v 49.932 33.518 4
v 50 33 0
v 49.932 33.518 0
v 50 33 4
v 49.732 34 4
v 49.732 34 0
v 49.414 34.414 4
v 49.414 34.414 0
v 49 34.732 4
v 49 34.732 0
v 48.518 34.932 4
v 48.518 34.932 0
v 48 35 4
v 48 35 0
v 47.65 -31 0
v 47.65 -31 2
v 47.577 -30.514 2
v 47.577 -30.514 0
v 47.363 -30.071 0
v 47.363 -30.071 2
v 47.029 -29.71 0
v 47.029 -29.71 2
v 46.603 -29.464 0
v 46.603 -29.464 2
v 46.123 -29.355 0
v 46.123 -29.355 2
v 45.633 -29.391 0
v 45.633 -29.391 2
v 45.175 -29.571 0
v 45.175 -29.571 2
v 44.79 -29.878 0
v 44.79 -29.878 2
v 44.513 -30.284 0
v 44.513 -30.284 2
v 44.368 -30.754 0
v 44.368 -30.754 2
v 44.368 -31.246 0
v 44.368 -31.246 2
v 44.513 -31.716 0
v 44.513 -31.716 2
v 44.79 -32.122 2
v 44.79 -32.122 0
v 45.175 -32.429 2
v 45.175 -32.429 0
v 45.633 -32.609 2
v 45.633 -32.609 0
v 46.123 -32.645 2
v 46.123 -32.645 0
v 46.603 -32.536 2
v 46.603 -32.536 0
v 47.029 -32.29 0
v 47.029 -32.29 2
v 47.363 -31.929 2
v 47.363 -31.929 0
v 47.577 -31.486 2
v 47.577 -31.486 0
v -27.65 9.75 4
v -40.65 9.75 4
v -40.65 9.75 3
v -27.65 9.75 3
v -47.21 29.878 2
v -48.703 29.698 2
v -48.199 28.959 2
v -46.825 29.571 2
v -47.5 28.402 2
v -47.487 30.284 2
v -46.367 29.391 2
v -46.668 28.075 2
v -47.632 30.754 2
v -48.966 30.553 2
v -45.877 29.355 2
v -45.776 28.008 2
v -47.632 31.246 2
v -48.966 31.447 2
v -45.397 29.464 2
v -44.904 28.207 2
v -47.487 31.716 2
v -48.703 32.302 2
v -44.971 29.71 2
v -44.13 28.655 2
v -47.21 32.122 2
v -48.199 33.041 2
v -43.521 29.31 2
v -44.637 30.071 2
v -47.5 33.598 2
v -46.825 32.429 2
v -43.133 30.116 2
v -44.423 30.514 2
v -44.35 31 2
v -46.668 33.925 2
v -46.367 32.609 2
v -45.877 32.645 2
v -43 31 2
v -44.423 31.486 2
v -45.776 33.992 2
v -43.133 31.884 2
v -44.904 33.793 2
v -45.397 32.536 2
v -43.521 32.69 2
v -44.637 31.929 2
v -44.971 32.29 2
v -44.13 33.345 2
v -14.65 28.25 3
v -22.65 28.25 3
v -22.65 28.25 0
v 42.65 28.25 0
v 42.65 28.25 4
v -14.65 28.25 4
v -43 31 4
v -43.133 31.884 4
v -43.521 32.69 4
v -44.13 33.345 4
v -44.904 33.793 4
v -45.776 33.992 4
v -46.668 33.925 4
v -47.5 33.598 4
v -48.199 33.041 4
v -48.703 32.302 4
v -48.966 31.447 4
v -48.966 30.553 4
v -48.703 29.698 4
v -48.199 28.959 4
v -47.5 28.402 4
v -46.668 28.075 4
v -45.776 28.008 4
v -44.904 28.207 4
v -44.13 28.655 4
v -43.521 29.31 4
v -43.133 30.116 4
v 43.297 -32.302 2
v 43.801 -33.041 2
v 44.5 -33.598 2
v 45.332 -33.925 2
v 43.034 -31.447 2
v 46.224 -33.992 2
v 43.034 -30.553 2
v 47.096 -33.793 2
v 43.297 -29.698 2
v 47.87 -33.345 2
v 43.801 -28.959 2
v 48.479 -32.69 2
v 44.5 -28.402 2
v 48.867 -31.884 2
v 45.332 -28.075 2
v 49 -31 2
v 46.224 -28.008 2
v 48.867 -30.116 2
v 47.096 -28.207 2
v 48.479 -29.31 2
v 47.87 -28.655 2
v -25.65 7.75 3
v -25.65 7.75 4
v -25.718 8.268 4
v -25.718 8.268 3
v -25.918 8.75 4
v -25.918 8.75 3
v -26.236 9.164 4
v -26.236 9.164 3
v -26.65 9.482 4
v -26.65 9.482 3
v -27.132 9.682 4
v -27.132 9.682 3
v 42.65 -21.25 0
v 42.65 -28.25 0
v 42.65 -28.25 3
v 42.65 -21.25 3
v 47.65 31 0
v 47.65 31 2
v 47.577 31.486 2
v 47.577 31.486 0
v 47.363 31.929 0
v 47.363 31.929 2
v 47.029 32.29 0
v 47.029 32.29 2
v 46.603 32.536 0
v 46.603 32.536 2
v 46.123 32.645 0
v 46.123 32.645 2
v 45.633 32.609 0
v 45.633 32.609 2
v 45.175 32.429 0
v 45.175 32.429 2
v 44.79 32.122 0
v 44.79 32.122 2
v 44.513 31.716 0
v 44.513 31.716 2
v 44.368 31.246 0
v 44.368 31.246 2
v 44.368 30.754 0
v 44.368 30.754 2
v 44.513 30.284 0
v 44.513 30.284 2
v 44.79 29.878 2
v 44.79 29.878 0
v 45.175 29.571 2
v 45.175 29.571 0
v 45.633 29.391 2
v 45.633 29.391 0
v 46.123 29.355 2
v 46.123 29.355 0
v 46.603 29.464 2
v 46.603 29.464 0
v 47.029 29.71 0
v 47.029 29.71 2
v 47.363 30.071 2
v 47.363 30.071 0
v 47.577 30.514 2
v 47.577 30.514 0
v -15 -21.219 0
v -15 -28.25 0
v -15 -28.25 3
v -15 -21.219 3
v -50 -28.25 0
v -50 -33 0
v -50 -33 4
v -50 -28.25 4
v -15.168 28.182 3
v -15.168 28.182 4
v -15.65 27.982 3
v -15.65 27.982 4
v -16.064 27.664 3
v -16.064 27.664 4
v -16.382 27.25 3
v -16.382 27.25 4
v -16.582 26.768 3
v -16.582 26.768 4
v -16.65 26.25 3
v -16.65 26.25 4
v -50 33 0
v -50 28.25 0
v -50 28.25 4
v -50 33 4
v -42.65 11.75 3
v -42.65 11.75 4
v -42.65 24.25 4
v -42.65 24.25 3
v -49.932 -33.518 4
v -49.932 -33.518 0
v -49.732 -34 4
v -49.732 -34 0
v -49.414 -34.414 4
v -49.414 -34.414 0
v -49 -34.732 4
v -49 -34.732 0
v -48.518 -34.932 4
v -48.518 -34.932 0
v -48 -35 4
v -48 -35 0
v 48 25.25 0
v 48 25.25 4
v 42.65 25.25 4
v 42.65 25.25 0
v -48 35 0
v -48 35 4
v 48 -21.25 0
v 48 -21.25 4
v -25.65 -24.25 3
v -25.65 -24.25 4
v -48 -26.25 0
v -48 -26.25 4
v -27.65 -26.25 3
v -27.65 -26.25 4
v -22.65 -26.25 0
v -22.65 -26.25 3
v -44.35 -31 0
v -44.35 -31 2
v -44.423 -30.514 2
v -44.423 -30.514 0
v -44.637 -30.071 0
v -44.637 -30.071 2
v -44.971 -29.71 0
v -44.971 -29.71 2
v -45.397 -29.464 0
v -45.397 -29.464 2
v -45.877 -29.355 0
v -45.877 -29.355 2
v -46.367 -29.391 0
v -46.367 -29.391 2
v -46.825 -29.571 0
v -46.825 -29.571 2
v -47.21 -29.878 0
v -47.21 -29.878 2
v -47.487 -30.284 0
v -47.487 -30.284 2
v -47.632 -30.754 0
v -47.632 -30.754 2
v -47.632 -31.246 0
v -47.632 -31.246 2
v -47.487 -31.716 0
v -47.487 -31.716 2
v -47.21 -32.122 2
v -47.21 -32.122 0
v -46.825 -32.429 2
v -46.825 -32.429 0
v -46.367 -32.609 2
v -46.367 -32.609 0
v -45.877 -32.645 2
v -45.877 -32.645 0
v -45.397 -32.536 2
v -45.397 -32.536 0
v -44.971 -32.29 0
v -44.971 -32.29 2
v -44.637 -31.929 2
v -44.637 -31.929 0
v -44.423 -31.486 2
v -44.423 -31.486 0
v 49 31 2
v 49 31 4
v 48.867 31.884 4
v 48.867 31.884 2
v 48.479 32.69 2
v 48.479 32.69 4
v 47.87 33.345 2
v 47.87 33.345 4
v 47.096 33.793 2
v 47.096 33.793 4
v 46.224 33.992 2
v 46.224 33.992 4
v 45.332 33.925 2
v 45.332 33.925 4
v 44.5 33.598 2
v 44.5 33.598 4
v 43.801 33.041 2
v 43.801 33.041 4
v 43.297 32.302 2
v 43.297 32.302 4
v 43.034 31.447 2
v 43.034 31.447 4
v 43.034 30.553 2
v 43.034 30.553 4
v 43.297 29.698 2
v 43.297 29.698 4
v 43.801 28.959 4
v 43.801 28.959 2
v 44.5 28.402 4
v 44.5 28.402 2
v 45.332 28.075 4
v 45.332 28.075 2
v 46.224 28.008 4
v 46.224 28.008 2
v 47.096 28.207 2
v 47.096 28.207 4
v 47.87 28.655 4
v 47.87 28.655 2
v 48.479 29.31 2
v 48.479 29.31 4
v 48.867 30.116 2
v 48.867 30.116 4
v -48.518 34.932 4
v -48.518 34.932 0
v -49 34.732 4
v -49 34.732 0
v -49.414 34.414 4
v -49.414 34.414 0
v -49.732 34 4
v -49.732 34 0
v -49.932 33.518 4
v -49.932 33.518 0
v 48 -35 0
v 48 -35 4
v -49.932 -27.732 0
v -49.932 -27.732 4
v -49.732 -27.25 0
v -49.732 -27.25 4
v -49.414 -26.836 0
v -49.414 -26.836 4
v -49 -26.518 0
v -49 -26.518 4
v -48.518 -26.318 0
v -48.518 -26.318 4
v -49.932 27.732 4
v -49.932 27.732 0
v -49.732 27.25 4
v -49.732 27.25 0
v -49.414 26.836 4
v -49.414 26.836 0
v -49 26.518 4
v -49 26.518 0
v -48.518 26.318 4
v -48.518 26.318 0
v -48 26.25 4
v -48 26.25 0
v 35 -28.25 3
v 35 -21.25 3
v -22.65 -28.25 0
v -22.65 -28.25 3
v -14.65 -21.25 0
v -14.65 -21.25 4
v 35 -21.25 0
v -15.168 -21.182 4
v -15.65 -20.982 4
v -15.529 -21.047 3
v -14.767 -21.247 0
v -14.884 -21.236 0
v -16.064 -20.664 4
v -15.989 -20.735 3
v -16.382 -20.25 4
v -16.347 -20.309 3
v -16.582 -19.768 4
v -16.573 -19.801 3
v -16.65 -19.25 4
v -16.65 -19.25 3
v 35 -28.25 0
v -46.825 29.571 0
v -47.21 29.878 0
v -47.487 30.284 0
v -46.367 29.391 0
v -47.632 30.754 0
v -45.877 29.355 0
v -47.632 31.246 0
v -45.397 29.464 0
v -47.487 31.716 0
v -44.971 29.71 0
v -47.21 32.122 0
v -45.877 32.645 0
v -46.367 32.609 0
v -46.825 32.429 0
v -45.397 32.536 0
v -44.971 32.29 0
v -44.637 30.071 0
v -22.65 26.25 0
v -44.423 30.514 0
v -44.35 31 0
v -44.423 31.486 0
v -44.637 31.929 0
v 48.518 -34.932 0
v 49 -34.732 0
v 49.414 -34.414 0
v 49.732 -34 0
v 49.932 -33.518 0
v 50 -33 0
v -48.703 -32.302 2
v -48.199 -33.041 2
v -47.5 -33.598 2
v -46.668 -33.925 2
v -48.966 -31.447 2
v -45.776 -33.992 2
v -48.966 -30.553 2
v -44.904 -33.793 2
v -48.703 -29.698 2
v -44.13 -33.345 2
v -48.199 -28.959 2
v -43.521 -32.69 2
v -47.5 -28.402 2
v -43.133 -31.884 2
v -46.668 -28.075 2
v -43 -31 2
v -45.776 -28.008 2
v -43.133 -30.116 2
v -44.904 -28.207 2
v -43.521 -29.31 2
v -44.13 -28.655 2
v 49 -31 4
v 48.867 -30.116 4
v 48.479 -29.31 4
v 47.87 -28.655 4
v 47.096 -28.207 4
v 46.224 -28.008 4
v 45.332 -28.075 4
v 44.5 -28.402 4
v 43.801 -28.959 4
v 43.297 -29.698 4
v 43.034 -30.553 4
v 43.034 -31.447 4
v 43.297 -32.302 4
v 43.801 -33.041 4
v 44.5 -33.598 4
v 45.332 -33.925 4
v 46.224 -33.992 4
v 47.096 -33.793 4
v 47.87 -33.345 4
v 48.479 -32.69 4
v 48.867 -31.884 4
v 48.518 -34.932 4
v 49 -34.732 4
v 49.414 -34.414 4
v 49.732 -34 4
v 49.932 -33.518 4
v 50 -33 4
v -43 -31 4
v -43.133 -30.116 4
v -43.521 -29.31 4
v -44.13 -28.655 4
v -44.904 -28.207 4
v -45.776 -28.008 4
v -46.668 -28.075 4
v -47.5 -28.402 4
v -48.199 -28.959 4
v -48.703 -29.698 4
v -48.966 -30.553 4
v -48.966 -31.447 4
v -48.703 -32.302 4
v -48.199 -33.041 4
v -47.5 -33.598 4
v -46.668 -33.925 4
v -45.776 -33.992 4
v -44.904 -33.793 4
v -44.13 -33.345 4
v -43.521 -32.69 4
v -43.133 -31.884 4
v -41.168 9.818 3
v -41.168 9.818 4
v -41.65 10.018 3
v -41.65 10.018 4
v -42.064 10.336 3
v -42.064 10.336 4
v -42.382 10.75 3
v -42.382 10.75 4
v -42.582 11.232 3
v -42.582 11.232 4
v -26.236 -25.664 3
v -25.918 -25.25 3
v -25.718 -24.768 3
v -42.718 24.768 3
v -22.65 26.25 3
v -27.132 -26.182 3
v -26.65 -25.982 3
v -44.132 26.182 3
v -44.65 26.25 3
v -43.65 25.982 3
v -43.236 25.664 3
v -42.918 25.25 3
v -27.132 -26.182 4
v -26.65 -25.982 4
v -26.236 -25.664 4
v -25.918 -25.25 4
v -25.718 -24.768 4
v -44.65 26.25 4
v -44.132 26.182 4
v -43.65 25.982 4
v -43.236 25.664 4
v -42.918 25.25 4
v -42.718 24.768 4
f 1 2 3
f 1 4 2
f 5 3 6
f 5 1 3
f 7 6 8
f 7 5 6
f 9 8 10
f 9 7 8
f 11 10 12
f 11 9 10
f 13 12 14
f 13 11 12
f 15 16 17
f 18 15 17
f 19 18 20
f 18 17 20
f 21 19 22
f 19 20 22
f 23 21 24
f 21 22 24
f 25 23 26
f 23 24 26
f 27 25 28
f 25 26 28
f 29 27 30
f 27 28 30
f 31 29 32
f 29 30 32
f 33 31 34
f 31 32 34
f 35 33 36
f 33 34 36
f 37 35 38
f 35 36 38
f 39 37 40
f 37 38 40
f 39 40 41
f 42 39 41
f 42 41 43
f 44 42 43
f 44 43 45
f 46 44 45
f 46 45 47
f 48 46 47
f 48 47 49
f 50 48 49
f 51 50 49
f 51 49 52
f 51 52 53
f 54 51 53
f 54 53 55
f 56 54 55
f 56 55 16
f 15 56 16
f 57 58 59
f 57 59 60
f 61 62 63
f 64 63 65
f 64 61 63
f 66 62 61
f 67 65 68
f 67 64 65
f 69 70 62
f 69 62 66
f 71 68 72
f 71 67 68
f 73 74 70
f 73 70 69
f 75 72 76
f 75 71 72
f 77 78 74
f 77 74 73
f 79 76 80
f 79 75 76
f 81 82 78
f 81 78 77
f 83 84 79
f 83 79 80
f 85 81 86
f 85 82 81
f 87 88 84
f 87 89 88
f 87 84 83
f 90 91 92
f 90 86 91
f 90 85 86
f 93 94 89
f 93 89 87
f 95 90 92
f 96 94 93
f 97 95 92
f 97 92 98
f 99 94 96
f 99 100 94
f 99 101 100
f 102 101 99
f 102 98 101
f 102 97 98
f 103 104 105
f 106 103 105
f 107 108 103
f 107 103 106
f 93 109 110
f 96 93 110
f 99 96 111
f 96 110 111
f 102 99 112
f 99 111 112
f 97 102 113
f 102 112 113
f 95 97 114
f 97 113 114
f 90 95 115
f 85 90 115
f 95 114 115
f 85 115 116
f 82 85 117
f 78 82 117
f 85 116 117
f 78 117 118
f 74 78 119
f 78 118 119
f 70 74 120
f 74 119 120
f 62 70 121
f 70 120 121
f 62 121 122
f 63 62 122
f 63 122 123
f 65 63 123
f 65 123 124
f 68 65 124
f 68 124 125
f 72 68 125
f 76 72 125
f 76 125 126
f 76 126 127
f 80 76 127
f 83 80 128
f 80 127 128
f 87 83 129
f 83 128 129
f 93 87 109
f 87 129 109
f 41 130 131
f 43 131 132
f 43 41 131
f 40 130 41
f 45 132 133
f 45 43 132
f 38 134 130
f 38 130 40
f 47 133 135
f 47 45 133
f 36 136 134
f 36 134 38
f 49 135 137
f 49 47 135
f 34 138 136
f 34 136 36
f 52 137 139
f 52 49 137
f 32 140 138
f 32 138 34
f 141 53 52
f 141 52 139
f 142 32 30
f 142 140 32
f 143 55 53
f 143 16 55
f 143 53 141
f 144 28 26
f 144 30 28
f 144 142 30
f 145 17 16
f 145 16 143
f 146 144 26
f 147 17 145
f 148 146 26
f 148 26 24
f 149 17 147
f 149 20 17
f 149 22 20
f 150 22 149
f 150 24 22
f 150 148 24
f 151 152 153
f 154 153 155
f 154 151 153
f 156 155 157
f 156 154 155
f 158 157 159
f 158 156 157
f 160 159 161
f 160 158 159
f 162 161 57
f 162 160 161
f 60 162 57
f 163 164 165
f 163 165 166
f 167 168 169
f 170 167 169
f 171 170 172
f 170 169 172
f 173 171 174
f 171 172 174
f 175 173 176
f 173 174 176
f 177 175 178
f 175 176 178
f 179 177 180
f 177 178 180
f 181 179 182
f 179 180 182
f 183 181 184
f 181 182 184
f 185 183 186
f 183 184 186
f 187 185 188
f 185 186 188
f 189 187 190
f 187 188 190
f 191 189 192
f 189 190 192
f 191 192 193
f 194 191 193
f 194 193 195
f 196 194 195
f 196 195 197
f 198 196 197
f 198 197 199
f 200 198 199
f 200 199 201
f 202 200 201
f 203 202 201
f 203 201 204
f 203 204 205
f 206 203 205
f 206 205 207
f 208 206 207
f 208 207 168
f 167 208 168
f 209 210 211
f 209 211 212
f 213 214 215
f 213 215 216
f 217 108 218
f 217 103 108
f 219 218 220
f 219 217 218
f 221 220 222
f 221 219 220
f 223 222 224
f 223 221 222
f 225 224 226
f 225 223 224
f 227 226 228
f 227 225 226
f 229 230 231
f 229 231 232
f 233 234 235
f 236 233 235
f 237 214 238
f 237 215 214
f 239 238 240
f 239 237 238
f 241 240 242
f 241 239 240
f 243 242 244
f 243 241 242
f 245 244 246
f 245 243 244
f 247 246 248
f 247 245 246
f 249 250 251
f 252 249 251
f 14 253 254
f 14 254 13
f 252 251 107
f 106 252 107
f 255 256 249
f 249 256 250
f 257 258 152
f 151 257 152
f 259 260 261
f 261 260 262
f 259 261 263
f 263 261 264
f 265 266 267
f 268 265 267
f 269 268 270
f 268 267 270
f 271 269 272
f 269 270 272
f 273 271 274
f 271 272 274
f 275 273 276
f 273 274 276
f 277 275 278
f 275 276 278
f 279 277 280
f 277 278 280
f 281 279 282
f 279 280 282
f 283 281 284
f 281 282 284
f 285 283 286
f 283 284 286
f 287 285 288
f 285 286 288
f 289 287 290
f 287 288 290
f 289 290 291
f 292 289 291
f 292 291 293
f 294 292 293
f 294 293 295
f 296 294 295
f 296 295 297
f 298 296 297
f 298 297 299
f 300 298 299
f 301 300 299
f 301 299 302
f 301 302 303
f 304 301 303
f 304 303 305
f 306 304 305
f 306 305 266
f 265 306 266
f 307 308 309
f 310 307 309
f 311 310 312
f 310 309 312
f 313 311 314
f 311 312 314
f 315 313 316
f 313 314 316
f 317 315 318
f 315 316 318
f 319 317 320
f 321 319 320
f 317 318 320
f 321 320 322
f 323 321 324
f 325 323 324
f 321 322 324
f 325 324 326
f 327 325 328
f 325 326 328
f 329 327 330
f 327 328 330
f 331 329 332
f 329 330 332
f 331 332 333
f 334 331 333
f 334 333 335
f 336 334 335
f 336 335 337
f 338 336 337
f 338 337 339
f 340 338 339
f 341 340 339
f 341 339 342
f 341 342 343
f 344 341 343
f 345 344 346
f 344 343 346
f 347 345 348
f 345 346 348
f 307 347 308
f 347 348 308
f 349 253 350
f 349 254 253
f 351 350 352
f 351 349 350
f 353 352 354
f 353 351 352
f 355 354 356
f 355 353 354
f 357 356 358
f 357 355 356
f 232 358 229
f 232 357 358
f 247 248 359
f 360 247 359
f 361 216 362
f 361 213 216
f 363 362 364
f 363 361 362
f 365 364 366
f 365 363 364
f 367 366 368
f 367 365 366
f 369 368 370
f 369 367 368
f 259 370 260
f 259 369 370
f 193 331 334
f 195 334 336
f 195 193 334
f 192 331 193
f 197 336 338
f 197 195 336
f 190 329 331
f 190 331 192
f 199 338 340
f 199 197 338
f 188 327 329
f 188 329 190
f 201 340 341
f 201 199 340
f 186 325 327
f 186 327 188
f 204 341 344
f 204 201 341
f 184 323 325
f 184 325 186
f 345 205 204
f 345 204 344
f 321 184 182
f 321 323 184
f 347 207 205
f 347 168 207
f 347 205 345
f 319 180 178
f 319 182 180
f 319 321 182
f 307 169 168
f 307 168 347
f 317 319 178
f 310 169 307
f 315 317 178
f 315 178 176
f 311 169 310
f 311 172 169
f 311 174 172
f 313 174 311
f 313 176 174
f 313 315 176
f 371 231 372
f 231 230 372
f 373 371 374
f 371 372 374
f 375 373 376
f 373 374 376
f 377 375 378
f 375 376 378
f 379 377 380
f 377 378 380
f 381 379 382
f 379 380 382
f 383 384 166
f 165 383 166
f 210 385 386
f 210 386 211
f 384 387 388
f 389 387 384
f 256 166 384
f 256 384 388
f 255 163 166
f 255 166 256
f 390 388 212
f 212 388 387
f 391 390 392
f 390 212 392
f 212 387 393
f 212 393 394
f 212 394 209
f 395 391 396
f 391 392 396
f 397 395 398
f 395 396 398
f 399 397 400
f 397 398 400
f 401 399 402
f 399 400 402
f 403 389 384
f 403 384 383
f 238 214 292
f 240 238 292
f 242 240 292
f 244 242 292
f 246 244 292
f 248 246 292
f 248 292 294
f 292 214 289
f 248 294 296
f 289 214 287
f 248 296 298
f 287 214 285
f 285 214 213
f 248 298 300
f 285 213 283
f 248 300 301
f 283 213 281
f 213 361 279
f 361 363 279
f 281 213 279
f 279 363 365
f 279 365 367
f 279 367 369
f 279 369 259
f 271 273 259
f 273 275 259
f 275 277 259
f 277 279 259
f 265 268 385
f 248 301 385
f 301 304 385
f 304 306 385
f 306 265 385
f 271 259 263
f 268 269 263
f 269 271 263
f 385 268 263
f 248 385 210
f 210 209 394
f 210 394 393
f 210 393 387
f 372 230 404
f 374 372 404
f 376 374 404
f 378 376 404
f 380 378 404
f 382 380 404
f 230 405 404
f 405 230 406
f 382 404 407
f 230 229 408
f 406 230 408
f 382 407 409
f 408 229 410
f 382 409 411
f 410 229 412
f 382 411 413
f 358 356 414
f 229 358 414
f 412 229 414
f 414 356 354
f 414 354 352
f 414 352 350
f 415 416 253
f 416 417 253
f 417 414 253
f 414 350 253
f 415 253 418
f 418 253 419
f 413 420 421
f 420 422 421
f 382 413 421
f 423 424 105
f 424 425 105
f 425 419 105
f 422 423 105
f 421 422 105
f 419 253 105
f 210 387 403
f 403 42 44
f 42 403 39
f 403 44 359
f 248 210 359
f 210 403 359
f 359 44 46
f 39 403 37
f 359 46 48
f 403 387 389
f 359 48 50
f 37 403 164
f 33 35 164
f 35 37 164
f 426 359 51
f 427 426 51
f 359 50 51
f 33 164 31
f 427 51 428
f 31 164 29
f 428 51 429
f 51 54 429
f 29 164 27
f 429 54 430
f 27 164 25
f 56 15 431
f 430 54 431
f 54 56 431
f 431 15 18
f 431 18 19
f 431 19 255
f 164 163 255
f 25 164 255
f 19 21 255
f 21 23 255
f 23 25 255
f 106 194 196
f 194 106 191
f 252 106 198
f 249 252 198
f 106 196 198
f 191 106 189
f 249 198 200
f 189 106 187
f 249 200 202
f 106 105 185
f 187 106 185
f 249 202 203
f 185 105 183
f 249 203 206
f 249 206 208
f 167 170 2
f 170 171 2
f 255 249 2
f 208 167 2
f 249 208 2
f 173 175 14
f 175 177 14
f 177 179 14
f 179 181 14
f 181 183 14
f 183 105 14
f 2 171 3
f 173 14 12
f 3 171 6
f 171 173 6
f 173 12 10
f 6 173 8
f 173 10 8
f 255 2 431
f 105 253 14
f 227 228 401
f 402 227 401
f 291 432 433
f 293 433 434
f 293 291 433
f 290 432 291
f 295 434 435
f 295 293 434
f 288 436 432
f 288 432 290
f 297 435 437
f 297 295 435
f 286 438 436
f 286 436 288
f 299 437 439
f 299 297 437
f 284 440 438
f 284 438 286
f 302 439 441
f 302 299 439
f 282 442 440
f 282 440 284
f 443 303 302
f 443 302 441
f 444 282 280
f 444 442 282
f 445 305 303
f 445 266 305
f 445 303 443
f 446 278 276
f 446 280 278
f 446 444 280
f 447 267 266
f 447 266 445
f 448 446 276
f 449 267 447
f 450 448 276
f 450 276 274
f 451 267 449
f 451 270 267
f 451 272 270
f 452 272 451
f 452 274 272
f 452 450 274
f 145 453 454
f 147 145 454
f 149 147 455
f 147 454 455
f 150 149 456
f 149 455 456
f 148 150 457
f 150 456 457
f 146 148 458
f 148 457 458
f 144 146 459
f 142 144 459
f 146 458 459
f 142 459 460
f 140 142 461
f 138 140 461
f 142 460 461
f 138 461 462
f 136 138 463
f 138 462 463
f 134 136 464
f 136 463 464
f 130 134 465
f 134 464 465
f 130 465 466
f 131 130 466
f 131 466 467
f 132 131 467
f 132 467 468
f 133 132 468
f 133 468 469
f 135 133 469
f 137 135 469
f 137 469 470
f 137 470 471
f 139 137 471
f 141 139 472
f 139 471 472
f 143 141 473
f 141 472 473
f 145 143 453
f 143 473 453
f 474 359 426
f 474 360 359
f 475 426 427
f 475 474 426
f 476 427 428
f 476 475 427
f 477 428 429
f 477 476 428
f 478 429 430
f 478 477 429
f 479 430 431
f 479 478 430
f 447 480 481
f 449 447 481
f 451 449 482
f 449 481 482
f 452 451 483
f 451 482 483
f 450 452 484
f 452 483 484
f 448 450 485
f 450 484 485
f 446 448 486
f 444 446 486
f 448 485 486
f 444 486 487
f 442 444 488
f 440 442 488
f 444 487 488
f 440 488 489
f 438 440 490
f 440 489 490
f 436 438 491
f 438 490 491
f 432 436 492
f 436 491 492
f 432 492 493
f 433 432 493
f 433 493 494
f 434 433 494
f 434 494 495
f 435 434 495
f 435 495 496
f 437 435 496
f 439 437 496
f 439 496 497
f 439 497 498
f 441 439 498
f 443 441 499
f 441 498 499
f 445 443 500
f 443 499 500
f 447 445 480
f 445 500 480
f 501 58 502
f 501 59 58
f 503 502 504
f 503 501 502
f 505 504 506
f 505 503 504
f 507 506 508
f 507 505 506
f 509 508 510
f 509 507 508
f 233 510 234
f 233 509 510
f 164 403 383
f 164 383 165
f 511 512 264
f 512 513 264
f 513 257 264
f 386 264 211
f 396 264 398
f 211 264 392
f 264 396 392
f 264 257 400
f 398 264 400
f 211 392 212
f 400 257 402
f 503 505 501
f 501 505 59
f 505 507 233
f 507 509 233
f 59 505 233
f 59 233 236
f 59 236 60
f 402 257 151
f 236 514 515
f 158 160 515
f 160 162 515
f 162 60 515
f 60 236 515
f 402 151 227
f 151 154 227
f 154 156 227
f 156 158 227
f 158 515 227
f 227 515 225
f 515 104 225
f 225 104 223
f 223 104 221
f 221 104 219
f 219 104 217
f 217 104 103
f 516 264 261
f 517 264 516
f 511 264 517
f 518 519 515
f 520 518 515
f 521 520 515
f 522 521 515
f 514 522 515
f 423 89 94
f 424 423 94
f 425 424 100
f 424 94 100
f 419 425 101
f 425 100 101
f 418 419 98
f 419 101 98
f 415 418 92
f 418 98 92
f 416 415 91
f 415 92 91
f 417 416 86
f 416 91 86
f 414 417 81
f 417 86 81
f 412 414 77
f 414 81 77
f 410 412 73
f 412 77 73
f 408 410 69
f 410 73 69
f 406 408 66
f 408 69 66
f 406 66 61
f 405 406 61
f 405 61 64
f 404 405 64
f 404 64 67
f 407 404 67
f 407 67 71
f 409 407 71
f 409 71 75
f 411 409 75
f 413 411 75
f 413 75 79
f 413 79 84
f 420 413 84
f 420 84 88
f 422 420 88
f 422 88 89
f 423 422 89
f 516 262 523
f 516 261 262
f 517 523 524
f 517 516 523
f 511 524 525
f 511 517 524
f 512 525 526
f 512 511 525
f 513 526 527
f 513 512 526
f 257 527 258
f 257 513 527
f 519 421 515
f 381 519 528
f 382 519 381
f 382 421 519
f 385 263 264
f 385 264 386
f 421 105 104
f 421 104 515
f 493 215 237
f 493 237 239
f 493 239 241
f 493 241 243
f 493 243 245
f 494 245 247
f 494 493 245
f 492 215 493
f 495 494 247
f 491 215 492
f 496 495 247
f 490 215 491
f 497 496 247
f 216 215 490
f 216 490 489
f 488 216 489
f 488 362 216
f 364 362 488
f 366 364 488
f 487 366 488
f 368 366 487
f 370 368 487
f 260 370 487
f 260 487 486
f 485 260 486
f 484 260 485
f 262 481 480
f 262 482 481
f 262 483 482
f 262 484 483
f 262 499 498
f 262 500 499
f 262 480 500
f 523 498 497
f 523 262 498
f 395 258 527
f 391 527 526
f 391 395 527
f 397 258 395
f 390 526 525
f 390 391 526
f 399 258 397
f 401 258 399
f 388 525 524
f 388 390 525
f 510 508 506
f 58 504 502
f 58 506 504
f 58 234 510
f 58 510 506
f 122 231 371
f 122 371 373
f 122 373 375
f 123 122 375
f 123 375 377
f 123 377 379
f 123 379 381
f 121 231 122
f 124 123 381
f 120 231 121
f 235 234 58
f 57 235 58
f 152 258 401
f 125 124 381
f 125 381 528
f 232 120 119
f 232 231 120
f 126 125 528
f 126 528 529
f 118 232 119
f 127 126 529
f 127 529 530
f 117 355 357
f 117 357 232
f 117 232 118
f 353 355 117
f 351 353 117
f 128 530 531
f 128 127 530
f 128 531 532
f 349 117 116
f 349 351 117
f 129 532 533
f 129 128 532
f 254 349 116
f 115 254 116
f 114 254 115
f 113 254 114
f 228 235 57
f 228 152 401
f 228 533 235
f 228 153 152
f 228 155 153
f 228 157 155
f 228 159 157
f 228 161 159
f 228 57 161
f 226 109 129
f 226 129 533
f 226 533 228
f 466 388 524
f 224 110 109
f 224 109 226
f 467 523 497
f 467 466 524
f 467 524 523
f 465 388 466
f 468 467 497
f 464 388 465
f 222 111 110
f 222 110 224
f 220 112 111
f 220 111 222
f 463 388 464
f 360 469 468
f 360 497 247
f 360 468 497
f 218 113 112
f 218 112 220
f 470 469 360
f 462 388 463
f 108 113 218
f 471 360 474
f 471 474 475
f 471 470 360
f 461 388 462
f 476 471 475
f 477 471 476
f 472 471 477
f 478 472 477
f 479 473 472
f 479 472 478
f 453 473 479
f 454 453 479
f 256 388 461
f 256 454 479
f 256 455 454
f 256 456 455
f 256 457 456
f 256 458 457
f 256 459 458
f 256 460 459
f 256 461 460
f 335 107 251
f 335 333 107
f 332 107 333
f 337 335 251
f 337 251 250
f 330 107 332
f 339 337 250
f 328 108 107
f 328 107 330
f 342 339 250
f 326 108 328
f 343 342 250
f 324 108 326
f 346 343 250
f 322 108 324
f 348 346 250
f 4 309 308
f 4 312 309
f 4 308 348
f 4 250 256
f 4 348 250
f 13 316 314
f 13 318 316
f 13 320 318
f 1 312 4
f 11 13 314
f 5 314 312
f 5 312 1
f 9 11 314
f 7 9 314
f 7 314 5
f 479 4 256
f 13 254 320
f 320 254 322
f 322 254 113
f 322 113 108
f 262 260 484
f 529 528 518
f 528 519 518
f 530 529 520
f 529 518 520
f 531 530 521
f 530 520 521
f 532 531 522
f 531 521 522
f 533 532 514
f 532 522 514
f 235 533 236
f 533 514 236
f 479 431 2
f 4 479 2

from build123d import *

# Parameters (mm, degrees)
F0_W     = 100
F0_H     = 70
F1_DEPTH = 4
F2_R     = 1.65
F3_DEPTH = 4
F2_W     = 17
F2_H     = 36
F2_W_2   = 59.3
F2_H_2   = 3
F4_DEPTH = 4
F6_DEPTH = 3
F7_R     = 3
F8_DEPTH = 2
F9_R     = 2


with BuildPart() as f1:
    # F0 (on Top) → F1 (new body)
    with BuildSketch(Plane.XY):
        Rectangle(F0_W, F0_H)
    extrude(amount=F1_DEPTH)

    # F2 (on face) → F3 (cut, through all)
    with BuildSketch(Plane.XY.offset(4)):
        with Locations((-46, 31)):
            Circle(F2_R)
        with Locations((46, 31)):
            Circle(F2_R)
        with Locations((46, -31)):
            Circle(F2_R)
        with Locations((-46, -31)):
            Circle(F2_R)
    extrude(amount=-F3_DEPTH, mode=Mode.SUBTRACT)

    # F2 (on face) → F4 (cut, through all)
    with BuildSketch(Plane.XY.offset(4)):
        with Locations((-34.15, -8.25)):
            Rectangle(F2_W, F2_H)
        Polygon((-42.65, -26.25), (-42.65, 9.75), (-42.65, 26.25), (-50, 26.25), (-50, -26.25), align=None)
        with Locations((13, 26.75)):
            Rectangle(F2_W_2, F2_H_2)
        Polygon((42.65, 25.25), (-16.65, 25.25), (-16.65, -21.25), (-15, -21.25), (35, -21.25), (42.65, -21.25), (48, -21.25), (48, 25.25), align=None)
    extrude(amount=-F4_DEPTH, mode=Mode.SUBTRACT)

    # F5 (on face) → F6 (cut)
    with BuildSketch(Plane.XY):
        Polygon((-50, -26.25), (-22.65, -26.25), (-22.65, -28.25), (-15, -28.25), (-15, -21.25), (35, -21.25), (35, -28.25), (42.65, -28.25), (42.65, -21.25), (48, -21.25), (48, 25.25), (42.65, 25.25), (42.65, 28.25), (-22.65, 28.25), (-22.65, 26.25), (-50, 26.25), align=None)
    extrude(amount=F6_DEPTH, mode=Mode.SUBTRACT)

    # F7 (on face) → F8 (cut)
    with BuildSketch(Plane.XY.offset(4)):
        with Locations((-46, 31)):
            Circle(F7_R)
        with Locations((46, 31)):
            Circle(F7_R)
        with Locations((46, -31)):
            Circle(F7_R)
        with Locations((-46, -31)):
            Circle(F7_R)
    extrude(amount=-F8_DEPTH, mode=Mode.SUBTRACT)

    # F9
    f9_edges = [f1.edges().sort_by_distance(p)[0] for p in [
        (-50, 35, 2),
        (-50, -35, 2),
        (50, -35, 2),
        (50, 35, 2),
        (-16.65, -21.25, 3.5),
        (-16.65, 28.25, 3.5),
        (-50, 26.25, 2),
        (-50, -26.25, 2),
        (-42.65, 26.25, 3.5),
        (-42.65, 9.75, 3.5),
        (-25.65, 9.75, 3.5),
        (-25.65, -26.25, 3.5),
    ]]
    fillet(f9_edges, radius=F9_R)


solid = f1.part
